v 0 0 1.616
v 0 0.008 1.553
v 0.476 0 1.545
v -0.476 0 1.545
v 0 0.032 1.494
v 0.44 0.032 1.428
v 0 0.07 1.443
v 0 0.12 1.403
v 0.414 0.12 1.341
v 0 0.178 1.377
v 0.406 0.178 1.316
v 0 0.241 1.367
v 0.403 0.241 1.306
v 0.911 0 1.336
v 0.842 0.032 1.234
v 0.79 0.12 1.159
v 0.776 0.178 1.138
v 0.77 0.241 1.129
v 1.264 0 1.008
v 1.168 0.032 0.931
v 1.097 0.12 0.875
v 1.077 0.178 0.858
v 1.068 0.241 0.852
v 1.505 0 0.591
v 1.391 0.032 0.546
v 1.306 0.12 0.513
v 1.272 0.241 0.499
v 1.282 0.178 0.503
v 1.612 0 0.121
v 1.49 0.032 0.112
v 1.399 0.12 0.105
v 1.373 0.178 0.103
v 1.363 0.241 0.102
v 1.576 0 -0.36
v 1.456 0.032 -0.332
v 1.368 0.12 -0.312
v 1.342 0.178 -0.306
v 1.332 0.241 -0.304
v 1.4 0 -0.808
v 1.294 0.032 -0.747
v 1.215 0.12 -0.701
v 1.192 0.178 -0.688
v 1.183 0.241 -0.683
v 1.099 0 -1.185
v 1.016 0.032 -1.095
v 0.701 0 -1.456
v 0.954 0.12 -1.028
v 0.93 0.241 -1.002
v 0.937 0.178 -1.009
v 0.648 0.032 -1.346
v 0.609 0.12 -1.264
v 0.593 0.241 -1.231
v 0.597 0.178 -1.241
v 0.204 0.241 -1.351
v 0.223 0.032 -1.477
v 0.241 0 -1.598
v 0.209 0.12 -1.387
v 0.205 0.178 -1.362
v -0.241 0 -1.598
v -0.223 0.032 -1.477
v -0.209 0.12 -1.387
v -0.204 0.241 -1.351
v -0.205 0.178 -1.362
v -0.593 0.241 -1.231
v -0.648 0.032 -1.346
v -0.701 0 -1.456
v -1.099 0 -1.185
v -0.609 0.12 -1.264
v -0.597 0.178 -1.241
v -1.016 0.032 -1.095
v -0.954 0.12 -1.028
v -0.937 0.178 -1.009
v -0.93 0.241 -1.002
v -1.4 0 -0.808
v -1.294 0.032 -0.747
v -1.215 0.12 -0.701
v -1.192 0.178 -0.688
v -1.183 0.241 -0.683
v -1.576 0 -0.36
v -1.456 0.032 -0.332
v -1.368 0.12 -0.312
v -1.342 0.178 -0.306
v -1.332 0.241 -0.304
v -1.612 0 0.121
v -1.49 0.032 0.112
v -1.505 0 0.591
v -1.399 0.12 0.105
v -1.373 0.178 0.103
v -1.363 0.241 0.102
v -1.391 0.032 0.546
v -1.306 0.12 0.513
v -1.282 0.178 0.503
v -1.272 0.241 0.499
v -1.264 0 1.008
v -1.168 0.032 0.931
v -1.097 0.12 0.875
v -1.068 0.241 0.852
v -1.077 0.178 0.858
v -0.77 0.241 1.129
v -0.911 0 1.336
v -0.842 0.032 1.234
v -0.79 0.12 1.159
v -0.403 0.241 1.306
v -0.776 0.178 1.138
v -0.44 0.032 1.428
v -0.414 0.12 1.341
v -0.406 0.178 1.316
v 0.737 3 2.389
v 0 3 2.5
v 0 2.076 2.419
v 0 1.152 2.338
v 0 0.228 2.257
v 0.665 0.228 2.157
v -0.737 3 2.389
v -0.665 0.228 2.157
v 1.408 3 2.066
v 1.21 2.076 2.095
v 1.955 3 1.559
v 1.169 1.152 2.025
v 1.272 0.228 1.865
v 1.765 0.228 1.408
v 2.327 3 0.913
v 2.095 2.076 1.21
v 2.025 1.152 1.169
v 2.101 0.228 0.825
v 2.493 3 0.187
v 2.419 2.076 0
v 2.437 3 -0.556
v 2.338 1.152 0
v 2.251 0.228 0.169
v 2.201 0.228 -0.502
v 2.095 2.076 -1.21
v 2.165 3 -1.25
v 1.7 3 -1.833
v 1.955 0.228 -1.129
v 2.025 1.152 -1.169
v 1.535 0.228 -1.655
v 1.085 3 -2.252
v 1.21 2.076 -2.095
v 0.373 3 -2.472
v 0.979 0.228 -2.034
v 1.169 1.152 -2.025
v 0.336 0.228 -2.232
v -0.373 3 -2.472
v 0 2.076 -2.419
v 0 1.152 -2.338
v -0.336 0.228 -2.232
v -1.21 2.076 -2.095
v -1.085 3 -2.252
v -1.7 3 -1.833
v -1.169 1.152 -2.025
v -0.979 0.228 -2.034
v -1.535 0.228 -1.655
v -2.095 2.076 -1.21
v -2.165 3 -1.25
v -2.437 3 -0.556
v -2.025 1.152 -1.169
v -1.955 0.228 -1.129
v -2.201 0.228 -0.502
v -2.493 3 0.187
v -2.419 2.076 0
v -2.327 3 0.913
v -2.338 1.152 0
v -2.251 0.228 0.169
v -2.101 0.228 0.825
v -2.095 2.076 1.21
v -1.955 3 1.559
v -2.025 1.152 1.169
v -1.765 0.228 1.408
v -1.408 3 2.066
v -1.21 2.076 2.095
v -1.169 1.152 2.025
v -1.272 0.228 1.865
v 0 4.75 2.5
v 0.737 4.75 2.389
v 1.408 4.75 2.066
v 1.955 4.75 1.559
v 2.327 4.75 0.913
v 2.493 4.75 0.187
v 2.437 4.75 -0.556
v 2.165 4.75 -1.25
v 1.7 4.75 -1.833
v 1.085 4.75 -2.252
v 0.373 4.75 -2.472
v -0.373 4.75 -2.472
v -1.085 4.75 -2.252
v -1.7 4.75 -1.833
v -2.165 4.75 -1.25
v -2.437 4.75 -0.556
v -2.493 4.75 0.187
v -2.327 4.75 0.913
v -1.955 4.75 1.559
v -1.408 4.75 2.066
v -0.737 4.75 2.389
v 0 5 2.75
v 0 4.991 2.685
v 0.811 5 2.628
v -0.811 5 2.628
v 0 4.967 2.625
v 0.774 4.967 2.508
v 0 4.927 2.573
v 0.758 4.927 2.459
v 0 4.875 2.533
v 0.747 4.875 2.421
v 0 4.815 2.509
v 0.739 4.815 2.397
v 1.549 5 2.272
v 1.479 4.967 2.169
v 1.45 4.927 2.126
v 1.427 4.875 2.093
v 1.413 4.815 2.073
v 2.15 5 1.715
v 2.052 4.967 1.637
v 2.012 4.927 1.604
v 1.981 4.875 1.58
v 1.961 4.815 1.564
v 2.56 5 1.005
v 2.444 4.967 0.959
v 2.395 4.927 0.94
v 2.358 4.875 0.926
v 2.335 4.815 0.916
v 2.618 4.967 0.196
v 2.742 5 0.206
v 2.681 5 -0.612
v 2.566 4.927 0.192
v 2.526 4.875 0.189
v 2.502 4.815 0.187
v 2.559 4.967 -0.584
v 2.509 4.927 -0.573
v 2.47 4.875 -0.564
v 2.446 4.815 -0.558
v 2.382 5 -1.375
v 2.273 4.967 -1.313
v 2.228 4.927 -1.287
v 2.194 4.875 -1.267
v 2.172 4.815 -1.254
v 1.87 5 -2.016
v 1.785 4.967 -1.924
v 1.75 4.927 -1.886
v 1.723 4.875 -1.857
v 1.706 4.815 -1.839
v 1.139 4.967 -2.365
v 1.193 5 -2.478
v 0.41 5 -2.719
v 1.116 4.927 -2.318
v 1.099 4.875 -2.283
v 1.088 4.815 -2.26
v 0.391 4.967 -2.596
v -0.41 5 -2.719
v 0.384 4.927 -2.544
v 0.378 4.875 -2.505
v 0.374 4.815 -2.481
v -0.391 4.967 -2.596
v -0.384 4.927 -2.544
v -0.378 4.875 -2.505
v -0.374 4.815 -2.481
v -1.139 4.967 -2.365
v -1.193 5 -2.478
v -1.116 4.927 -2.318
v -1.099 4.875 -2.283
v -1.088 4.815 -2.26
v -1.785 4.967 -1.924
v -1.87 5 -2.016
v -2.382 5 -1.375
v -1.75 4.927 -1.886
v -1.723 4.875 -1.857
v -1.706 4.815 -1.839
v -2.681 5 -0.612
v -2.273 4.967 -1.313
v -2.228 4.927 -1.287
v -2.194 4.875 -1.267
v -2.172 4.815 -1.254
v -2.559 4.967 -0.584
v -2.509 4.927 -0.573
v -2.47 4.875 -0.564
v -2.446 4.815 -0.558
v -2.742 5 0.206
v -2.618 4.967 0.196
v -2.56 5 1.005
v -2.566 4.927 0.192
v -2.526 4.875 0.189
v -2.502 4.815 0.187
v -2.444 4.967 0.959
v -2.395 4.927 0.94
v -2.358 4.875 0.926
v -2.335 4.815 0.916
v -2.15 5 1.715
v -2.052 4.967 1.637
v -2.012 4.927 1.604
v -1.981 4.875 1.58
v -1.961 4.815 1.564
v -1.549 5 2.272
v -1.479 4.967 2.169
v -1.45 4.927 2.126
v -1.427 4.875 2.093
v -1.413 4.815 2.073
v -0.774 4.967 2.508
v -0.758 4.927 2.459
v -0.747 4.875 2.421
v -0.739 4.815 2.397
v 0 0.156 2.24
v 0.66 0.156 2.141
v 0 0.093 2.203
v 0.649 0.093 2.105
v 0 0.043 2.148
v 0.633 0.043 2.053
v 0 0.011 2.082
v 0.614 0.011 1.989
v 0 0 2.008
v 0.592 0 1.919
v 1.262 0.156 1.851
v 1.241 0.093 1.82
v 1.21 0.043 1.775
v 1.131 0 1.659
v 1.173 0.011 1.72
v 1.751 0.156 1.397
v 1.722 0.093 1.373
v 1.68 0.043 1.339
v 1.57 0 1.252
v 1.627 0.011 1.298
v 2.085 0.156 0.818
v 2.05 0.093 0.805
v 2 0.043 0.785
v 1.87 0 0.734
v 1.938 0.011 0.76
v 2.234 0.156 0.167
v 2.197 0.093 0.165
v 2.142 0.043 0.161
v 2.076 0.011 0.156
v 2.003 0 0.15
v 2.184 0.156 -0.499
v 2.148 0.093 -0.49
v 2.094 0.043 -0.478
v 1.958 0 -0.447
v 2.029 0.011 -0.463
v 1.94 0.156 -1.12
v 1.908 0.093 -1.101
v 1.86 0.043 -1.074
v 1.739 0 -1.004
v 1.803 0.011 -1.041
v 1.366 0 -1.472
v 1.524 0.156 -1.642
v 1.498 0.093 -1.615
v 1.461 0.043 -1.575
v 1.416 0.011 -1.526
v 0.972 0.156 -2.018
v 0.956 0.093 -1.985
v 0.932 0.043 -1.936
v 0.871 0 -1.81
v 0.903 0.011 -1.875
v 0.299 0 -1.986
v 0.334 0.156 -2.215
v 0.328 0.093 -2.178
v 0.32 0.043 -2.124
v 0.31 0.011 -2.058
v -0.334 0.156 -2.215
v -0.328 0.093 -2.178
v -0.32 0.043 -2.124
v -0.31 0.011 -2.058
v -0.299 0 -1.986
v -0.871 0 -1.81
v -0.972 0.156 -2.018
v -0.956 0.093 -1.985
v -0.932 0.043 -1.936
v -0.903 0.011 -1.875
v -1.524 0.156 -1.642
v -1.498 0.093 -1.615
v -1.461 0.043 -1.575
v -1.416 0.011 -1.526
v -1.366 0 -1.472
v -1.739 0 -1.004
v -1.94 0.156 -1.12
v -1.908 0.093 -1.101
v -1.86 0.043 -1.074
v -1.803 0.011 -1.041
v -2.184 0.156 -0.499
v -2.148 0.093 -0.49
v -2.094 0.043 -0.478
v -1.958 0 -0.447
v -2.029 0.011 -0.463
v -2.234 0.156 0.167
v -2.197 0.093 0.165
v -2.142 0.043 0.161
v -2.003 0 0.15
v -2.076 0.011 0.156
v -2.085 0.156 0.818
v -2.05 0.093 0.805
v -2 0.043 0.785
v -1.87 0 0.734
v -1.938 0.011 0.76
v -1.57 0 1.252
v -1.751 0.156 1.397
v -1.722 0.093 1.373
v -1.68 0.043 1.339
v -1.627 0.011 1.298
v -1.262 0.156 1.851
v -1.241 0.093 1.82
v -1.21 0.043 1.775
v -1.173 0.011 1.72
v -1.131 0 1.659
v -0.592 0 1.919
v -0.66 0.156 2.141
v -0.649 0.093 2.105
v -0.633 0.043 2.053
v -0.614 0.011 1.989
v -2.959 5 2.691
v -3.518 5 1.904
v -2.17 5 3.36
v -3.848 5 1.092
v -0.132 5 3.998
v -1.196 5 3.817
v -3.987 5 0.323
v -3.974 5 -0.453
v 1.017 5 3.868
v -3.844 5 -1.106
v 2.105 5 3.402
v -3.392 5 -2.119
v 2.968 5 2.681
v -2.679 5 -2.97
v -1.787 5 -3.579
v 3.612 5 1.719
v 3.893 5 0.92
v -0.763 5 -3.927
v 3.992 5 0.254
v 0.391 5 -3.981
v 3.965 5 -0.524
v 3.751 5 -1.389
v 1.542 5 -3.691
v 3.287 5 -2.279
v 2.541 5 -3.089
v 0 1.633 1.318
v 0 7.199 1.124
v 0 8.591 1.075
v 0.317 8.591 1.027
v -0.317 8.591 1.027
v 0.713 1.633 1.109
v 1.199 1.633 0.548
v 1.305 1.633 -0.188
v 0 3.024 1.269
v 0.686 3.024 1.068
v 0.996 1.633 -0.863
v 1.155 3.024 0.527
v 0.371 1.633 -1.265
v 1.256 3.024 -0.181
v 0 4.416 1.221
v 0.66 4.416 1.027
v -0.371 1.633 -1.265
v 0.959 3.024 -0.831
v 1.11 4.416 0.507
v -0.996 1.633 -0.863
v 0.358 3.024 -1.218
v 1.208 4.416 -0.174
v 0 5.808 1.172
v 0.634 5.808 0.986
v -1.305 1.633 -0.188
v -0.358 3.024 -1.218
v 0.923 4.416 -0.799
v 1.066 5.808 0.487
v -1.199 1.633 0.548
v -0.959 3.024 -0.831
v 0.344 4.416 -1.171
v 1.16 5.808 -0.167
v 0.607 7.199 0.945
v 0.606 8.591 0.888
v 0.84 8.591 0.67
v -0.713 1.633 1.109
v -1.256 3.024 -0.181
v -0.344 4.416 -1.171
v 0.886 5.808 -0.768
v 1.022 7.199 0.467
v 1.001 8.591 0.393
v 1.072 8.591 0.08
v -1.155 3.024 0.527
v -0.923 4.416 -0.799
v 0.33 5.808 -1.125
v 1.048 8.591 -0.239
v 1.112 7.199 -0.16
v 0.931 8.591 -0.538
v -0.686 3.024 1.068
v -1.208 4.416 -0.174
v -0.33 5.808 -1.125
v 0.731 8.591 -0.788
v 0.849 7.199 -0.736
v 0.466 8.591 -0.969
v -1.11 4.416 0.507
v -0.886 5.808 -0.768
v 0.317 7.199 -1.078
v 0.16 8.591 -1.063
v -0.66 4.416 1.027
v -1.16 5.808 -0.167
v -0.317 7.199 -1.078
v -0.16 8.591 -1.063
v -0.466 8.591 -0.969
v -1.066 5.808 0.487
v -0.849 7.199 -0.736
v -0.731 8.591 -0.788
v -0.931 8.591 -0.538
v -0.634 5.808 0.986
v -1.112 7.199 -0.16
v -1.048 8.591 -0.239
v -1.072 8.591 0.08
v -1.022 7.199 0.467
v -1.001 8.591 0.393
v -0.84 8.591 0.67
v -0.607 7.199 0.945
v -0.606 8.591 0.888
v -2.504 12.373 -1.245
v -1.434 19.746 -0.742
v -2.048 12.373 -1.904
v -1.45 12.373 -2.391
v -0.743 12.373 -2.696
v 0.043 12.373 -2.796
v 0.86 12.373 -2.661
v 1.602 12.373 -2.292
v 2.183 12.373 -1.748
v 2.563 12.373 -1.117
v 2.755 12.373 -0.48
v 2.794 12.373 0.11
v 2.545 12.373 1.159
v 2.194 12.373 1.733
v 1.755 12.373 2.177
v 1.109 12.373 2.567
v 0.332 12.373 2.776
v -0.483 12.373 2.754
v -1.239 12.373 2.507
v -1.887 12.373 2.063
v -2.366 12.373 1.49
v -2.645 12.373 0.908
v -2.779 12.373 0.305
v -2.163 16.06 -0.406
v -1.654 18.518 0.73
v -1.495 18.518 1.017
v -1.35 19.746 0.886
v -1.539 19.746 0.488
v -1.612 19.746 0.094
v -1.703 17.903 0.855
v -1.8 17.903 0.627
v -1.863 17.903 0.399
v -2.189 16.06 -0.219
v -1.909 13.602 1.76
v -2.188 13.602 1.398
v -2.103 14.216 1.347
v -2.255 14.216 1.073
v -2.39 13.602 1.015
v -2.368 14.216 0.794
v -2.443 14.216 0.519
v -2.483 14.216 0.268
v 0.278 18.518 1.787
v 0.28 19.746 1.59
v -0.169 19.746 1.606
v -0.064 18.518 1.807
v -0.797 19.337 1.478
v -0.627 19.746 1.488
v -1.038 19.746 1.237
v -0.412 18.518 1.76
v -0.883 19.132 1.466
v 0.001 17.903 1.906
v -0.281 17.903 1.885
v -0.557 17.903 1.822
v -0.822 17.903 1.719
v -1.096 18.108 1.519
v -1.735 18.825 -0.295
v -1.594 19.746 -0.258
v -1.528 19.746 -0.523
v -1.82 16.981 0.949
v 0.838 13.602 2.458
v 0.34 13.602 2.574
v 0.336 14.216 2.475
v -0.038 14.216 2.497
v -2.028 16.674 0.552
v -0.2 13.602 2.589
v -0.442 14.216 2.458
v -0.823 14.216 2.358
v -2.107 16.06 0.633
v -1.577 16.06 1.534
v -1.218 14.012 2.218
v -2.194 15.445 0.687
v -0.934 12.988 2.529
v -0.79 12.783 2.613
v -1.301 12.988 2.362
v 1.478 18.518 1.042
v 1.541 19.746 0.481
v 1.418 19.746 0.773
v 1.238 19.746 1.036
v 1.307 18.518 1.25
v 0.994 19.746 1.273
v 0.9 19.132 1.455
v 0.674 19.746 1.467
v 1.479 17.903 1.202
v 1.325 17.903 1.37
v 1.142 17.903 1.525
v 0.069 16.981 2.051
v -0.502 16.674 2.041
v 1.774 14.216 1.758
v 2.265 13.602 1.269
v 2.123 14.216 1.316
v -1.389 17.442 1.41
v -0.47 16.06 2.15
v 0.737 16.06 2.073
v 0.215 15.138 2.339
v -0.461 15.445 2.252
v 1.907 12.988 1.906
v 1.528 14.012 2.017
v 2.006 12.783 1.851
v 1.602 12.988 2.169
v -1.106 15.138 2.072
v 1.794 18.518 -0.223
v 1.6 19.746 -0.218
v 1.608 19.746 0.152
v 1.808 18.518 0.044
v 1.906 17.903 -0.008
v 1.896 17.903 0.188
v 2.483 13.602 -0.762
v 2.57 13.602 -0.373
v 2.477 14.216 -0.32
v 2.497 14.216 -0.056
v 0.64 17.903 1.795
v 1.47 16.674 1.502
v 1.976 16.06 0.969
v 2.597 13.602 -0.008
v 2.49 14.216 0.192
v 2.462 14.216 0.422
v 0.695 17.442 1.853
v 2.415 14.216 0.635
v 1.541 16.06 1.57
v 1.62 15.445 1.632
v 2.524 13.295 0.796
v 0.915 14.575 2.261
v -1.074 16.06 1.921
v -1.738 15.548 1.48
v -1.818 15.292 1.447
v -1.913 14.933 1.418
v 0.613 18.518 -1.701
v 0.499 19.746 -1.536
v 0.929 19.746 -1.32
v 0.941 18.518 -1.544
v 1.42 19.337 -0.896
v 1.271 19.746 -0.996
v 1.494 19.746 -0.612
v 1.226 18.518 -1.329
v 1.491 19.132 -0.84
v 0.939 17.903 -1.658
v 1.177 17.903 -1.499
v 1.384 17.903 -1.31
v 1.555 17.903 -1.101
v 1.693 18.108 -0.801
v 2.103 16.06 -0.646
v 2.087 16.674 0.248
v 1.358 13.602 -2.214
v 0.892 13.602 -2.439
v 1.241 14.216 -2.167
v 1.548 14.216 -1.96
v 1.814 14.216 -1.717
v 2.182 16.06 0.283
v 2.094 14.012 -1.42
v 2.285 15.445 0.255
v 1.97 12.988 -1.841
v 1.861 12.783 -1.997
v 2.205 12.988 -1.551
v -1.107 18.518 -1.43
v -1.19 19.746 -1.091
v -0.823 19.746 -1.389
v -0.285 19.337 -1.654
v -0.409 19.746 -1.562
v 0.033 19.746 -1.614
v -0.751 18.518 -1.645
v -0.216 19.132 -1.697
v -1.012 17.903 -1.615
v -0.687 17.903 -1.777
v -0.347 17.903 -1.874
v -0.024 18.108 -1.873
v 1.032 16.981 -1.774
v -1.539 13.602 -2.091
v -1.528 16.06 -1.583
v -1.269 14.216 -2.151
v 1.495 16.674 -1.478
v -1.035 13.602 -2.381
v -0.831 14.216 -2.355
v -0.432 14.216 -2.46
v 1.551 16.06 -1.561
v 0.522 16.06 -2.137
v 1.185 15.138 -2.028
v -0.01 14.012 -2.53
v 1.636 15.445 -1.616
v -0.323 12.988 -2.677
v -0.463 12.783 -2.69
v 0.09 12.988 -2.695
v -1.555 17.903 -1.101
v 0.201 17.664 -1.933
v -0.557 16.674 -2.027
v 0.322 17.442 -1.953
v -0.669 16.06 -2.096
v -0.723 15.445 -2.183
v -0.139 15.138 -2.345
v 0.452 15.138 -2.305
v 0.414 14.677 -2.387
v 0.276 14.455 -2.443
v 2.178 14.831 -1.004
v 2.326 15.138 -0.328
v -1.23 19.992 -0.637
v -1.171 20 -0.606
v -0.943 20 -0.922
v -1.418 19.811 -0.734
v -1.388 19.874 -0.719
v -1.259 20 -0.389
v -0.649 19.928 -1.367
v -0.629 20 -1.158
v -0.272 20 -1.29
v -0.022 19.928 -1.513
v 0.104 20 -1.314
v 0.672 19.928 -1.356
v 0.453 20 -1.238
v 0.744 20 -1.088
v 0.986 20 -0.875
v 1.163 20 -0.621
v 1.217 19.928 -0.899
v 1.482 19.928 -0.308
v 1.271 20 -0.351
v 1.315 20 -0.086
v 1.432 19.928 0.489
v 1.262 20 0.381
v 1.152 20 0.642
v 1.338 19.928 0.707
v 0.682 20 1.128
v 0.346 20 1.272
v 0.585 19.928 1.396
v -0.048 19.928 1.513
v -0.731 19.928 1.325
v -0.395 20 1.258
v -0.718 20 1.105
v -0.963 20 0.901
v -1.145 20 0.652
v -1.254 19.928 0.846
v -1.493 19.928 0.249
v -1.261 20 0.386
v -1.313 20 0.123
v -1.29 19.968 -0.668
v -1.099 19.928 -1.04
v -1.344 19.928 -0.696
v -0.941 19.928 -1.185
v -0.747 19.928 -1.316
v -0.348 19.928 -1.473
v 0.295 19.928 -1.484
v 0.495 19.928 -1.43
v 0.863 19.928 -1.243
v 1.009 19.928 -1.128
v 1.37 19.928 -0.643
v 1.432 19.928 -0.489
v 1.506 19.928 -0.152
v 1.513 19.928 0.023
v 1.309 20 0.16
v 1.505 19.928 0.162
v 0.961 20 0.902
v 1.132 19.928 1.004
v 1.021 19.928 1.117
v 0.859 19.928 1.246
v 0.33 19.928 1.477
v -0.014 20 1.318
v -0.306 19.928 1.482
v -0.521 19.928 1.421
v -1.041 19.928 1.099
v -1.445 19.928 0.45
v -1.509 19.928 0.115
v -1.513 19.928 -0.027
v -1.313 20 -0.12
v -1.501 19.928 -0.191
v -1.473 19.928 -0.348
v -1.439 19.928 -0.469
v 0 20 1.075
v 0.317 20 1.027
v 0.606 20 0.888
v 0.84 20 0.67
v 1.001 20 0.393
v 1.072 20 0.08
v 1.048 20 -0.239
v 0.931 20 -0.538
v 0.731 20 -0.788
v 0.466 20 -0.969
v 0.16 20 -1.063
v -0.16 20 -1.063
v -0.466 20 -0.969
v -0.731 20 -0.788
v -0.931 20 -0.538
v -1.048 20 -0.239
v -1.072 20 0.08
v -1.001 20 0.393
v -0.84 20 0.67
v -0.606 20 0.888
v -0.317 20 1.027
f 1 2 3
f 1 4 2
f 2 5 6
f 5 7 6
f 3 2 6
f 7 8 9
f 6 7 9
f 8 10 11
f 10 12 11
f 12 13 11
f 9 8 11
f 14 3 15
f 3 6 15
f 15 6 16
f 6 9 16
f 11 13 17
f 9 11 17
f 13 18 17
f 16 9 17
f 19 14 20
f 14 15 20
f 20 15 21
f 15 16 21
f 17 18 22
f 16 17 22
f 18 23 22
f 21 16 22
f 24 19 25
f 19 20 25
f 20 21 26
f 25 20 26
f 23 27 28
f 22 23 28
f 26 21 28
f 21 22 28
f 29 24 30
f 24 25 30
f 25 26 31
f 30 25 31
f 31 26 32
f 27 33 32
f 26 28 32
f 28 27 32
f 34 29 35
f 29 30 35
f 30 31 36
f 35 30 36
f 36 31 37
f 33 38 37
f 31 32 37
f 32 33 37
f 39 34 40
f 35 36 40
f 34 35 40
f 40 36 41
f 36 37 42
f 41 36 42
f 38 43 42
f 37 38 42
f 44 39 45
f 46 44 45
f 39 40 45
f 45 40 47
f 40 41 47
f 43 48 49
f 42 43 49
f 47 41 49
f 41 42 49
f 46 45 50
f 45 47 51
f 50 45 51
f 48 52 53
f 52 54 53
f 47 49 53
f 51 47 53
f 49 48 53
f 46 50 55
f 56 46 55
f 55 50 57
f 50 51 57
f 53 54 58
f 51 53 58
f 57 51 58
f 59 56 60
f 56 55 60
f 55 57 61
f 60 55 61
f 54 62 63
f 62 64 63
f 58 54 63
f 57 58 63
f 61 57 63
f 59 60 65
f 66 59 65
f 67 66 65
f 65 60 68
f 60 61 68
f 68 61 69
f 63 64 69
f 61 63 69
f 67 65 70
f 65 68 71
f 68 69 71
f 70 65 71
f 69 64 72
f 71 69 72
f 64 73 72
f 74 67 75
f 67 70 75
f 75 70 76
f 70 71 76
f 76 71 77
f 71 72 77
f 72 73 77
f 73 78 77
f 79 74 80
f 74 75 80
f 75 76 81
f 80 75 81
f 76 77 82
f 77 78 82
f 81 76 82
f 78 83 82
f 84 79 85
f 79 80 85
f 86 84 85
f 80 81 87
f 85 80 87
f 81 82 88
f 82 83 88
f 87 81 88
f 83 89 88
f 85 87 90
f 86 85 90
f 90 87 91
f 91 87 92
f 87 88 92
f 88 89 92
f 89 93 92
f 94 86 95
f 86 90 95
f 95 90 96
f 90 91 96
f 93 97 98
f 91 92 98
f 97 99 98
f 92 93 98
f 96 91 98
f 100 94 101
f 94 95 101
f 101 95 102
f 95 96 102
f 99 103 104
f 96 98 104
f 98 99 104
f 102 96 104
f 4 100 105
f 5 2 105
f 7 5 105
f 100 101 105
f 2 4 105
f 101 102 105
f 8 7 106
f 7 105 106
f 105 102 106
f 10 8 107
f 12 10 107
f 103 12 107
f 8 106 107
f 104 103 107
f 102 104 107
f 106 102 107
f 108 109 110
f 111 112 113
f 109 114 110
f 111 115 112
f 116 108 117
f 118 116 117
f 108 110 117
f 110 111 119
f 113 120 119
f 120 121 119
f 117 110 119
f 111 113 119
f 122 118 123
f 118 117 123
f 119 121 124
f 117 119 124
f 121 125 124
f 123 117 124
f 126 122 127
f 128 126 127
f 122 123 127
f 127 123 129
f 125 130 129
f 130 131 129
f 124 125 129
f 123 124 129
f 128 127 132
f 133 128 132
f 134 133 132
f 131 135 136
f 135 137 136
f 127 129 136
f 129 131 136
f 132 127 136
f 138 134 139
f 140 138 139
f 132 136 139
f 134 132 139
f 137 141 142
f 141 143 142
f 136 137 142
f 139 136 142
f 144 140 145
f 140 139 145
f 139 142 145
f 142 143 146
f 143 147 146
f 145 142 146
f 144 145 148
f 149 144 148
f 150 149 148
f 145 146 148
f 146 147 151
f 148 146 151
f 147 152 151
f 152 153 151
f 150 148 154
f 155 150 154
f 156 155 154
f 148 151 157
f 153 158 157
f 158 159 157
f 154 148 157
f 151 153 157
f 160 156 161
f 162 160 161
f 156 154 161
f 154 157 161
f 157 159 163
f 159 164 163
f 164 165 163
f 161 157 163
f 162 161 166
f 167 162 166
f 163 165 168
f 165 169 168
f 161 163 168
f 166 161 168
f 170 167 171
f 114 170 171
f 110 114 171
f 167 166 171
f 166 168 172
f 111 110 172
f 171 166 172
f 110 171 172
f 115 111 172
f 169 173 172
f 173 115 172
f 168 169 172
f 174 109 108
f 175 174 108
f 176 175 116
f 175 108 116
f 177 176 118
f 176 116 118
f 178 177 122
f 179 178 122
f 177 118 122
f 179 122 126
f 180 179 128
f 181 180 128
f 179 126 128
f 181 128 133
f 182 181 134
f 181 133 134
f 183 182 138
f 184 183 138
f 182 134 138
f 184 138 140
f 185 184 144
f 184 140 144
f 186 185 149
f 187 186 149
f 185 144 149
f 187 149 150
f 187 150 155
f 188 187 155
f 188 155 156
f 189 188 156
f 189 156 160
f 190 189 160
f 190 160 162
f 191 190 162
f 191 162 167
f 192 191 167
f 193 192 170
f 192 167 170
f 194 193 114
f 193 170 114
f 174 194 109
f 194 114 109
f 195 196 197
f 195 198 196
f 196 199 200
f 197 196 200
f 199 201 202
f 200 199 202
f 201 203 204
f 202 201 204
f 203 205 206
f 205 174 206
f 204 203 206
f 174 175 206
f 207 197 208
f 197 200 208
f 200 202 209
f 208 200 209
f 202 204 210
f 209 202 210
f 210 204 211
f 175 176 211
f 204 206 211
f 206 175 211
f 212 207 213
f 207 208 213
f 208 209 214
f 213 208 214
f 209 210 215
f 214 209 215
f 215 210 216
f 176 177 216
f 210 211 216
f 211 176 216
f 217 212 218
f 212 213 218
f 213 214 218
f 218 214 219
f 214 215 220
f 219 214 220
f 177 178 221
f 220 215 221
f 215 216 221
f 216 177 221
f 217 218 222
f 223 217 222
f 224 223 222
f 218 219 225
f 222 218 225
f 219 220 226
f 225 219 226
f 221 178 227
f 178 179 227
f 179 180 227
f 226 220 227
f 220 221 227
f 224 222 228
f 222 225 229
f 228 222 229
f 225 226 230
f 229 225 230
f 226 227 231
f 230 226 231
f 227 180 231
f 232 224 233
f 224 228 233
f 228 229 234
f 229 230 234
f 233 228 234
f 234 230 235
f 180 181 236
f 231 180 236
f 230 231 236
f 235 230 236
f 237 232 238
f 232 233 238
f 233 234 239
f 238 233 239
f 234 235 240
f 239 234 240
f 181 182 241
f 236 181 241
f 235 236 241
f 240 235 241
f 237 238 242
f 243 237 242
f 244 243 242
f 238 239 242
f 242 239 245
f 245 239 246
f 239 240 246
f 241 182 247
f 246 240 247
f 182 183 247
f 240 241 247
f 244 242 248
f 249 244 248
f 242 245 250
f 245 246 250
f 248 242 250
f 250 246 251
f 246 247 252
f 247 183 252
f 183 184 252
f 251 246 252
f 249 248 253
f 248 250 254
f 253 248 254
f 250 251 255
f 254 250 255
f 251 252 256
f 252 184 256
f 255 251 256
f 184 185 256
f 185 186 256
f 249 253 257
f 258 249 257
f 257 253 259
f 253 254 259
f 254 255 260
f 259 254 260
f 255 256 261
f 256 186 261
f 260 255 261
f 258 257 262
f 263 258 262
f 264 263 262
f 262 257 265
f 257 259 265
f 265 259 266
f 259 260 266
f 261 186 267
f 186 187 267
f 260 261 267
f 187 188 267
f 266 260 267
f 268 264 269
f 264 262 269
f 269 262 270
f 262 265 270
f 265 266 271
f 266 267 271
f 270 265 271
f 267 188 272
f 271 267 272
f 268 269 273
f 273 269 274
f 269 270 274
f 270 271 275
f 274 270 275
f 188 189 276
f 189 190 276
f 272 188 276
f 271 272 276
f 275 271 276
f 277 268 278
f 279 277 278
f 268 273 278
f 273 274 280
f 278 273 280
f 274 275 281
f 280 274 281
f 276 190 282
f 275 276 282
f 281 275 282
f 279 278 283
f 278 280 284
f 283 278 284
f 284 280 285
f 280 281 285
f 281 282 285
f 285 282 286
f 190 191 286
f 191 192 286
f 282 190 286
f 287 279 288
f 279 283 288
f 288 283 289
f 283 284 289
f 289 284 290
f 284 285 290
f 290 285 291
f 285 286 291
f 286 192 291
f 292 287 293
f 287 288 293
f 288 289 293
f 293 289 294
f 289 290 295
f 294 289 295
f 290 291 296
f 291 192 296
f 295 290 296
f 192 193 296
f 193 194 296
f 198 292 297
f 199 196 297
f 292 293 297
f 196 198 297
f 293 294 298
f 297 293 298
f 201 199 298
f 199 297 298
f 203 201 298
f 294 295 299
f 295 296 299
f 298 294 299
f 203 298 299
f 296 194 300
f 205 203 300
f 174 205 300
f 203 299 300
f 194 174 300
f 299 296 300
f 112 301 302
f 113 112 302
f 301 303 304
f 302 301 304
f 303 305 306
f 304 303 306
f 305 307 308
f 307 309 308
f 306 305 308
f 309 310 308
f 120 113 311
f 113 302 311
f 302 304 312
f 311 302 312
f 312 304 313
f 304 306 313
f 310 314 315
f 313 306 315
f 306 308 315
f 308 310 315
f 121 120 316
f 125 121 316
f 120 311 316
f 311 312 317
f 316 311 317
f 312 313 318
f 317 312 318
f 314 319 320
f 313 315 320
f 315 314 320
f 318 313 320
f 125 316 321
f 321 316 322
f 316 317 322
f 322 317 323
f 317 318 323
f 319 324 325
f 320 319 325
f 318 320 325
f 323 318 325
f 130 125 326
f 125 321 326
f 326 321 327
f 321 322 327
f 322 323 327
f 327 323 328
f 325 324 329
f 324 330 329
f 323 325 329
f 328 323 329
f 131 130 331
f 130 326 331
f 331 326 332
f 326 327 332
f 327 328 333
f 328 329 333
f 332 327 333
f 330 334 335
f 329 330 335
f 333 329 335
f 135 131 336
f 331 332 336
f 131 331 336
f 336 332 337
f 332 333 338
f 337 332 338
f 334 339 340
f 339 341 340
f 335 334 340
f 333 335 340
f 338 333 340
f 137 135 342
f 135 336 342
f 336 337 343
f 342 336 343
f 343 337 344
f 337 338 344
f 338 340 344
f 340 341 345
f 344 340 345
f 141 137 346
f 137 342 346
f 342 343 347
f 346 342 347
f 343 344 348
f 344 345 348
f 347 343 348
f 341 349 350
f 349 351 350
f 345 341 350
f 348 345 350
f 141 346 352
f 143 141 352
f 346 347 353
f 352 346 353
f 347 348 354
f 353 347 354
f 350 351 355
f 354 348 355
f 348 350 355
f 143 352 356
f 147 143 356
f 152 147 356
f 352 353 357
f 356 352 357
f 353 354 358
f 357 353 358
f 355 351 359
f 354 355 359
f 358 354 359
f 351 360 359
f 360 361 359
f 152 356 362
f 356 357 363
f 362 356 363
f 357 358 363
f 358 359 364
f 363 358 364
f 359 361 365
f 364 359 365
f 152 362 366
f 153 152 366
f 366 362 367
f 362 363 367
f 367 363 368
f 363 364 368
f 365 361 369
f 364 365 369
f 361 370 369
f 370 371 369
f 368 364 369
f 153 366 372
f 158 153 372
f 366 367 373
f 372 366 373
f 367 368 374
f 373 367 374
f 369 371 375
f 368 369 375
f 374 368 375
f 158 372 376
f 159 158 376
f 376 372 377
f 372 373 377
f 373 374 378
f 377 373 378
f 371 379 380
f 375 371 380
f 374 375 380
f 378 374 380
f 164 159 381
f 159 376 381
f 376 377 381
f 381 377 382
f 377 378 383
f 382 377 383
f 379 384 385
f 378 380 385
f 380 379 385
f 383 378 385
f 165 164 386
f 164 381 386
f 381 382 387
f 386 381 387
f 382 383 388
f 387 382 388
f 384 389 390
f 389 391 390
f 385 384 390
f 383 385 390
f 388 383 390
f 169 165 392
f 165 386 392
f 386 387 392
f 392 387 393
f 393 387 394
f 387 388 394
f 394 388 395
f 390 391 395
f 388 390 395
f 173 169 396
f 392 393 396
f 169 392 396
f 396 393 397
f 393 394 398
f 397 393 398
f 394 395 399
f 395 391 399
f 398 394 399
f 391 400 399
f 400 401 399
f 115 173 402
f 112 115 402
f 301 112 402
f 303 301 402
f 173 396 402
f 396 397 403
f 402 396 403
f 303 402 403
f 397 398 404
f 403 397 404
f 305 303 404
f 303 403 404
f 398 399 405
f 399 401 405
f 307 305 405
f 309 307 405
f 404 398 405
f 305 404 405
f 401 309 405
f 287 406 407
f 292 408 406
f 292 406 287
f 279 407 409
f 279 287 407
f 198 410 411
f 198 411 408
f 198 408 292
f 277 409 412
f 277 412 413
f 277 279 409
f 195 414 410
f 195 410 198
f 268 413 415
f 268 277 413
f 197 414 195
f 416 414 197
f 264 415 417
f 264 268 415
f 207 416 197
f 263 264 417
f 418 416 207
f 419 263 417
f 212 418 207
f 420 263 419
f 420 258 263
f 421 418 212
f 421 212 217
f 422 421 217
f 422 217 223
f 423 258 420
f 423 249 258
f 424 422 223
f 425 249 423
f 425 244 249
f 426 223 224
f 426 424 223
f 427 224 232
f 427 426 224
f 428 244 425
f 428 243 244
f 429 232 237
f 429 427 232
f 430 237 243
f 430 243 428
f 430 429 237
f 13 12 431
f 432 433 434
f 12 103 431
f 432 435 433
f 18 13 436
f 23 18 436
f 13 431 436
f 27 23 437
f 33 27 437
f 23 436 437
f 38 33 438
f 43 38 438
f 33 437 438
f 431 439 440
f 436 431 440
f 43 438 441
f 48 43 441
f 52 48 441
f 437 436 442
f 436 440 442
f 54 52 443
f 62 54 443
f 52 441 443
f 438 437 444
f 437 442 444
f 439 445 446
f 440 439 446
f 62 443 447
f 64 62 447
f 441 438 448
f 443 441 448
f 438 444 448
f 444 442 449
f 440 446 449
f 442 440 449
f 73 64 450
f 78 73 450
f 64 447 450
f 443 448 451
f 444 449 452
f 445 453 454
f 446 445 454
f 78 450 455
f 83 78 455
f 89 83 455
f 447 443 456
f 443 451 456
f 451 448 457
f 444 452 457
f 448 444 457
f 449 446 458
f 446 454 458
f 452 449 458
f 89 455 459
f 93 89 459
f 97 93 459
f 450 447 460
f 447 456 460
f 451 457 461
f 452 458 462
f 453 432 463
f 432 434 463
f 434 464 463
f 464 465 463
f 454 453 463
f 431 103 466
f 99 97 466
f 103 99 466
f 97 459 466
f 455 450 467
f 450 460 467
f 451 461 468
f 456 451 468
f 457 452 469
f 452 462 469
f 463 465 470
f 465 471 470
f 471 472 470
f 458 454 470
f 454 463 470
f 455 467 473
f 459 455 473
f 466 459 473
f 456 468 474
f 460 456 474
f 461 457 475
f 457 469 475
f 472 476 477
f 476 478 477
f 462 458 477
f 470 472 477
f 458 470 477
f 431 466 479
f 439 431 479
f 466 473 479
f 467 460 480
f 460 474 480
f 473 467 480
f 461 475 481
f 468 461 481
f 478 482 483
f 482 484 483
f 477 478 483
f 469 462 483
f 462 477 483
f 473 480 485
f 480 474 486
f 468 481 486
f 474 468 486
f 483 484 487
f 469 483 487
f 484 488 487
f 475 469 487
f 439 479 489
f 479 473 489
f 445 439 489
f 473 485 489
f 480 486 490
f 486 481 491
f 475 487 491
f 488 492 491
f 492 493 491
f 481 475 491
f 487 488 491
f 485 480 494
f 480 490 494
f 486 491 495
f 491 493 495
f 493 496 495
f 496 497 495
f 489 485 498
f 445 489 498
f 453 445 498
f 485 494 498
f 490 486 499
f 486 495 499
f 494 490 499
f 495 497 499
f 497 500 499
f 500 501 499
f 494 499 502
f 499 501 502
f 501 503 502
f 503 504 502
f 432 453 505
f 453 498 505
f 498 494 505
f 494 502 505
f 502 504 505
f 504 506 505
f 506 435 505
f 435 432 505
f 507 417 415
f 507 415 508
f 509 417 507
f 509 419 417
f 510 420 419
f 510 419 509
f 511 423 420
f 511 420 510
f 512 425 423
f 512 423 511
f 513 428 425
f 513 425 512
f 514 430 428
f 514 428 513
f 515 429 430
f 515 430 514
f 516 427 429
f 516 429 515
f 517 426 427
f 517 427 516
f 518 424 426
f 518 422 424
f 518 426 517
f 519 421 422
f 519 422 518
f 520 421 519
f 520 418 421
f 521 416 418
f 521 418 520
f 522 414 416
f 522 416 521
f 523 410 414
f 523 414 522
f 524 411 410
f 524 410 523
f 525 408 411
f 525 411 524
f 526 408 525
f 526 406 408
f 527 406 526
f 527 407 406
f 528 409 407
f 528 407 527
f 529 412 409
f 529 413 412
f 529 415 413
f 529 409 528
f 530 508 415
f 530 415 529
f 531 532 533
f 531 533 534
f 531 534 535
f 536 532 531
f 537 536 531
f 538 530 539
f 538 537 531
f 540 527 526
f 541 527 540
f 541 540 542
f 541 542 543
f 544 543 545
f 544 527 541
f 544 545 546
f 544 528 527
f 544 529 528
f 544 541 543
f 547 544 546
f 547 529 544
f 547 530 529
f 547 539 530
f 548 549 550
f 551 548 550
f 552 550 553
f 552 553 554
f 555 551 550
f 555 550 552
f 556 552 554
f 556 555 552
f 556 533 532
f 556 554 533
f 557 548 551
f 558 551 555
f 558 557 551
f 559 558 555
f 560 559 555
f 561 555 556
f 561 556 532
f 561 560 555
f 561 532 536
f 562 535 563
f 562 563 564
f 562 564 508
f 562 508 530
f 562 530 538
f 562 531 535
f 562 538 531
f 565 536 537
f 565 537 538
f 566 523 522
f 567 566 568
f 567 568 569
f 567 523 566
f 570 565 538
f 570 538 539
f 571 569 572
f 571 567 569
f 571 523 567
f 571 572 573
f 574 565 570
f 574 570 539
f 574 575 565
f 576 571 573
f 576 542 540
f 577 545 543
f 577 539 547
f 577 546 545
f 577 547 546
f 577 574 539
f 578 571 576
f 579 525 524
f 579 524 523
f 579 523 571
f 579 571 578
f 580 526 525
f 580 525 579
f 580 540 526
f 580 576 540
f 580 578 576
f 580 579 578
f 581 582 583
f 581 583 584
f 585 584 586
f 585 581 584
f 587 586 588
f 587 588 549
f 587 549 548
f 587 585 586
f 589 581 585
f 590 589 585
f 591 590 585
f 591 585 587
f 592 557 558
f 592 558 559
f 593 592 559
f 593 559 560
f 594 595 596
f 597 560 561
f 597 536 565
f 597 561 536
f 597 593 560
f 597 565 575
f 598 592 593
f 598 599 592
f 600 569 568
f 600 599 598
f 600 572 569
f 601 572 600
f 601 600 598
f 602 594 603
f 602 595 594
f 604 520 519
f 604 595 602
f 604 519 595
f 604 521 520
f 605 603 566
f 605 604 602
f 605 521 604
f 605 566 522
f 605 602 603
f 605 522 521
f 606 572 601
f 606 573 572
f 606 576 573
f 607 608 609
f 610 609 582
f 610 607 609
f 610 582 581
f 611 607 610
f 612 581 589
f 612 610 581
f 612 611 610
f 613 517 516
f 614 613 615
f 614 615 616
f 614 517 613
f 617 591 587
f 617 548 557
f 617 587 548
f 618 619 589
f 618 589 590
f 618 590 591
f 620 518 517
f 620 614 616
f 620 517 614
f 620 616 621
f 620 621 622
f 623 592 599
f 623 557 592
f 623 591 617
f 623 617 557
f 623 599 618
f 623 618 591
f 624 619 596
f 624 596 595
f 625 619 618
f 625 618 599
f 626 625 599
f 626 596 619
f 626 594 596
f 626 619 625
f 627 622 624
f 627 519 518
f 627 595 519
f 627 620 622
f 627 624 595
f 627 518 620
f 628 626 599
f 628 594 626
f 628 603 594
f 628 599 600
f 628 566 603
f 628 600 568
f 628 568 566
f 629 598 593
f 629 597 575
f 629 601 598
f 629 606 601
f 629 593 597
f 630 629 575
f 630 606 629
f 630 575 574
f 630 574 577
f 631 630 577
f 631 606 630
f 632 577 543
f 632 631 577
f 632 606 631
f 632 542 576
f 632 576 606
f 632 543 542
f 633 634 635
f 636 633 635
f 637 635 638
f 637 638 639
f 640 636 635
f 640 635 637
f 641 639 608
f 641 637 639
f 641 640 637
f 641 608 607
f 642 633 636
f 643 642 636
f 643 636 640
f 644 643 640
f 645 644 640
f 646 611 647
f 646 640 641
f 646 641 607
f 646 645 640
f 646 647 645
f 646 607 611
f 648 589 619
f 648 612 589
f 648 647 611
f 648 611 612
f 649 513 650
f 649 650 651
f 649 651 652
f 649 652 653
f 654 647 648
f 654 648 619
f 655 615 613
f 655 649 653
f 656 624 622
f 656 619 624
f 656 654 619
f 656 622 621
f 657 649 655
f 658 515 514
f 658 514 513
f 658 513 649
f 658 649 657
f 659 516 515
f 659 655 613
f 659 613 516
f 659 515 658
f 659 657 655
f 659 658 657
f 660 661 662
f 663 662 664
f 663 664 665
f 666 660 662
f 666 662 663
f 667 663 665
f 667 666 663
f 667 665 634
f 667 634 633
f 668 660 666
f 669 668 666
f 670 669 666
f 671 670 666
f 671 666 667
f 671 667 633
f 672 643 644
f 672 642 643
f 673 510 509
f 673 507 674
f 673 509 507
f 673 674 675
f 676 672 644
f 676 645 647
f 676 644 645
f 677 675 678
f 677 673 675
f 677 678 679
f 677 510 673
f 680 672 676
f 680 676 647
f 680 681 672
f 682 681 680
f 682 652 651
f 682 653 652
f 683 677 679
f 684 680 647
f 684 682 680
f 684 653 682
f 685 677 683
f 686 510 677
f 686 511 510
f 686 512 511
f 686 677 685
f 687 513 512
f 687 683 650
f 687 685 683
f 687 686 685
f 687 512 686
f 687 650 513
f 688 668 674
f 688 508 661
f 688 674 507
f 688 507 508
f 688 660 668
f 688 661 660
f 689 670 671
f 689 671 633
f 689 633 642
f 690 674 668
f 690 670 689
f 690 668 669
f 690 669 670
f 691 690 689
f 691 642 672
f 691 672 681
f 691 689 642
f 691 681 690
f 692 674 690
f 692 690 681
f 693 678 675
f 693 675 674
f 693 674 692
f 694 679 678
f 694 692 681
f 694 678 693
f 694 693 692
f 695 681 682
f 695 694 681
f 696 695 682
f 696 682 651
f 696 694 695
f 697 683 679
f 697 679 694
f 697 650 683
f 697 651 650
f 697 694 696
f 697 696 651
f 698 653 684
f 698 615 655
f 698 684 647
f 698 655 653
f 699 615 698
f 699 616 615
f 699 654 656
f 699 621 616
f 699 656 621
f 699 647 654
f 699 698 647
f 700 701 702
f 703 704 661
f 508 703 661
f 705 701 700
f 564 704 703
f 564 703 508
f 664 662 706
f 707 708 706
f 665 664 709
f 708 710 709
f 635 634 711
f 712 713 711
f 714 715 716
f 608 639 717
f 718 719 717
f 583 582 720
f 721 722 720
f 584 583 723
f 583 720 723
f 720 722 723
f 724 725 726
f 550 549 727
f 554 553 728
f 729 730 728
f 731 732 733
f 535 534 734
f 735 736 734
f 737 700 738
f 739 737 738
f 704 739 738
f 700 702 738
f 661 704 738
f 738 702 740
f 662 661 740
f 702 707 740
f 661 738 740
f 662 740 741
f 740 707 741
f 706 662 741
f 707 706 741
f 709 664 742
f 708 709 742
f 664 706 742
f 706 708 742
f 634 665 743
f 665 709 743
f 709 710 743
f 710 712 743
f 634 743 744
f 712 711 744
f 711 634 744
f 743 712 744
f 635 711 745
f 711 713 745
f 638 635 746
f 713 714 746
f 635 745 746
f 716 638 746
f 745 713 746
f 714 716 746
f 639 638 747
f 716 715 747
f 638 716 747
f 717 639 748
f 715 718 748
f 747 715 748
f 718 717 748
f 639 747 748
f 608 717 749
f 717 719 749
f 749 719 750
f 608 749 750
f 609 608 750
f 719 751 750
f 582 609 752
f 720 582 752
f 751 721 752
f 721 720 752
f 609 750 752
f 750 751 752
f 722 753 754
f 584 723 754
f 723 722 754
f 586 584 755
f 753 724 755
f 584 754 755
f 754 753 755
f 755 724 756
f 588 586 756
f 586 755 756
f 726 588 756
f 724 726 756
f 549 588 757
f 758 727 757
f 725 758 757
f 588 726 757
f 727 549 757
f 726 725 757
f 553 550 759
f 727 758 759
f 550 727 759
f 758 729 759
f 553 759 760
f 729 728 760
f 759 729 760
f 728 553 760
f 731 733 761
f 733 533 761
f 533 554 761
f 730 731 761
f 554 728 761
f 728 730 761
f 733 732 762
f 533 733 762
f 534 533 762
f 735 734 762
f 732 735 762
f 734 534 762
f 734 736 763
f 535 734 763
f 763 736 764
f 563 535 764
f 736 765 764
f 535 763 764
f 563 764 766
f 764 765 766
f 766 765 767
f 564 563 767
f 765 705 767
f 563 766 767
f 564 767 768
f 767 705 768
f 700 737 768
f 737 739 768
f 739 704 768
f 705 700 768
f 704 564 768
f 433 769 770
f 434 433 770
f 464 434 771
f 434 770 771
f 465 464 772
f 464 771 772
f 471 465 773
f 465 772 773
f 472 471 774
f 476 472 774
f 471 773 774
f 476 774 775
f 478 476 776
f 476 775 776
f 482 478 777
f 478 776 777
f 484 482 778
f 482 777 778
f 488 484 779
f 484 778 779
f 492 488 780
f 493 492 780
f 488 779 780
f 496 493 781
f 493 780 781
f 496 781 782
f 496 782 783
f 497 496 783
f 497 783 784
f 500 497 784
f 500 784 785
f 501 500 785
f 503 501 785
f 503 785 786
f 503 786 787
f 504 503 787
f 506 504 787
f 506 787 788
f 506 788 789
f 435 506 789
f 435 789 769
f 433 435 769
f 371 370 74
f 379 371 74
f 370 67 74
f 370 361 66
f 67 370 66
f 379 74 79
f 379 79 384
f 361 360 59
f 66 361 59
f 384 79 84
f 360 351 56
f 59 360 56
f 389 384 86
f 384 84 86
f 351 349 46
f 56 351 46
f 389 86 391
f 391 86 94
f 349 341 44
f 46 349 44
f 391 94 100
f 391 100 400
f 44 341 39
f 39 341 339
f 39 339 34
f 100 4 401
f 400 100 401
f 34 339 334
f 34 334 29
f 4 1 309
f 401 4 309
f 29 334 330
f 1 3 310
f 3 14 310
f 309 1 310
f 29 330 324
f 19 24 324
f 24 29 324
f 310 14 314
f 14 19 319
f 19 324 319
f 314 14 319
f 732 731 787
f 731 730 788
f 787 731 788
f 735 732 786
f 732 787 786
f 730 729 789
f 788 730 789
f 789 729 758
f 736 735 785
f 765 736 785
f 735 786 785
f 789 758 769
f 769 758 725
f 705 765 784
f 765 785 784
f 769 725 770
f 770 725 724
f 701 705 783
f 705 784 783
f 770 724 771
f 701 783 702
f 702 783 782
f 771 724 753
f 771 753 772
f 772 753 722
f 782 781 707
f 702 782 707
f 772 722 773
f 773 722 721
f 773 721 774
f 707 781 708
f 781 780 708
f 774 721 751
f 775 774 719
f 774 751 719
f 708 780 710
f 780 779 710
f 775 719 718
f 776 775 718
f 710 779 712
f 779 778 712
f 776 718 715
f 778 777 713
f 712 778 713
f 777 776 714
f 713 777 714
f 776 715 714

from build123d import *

# Parameters (mm, degrees)
SKETCH1_R           = 2.5
BOSS_EXTRUDE1_DEPTH = 5
SKETCH4_R           = 1.075
CUT_EXTRUDE1_DEPTH  = 21.784609729
CHAMFER1_SIZE       = 0.3
CHAMFER1_SIZE2      = 8.590875985
CHAMFER2_SIZE       = 3
CHAMFER2_SIZE2      = 0.262465991
FILLET1_R           = 0.3
FILLET2_R           = 0.25
FILLET4_R           = 0.25


with BuildPart() as part:
    # Sketch1 → Boss-Extrude1 (new body)
    with BuildSketch(Plane(origin=(0, 0, 0), x_dir=(1, 0, 0), z_dir=(0, 1, 0))):
        with Locations(Location((0, 0, 0), (0, 0, 270))):
            Circle(SKETCH1_R)
    extrude(amount=BOSS_EXTRUDE1_DEPTH)

    # Loft1: read off the stored shape, not the designer's step
    # Loft1: loft between two sections, ruled curve by curve
    loft1_from = [
        Edge.make_bspline([(-1.392393657, 20, -0.736114736), (0.079835815, 20, -3.52090205), (2.864623129, 20, -2.048672577), (1.392393657, 20, 0.736114736), (-0.079835815, 20, 3.52090205), (-2.864623129, 20, 2.048672577), (-1.392393657, 20, -0.736114736)], [0, 0, 0, 0, 0.5, 0.5, 0.5, 1, 1, 1, 1], 3, [1, 0.333333333, 0.333333333, 1, 0.333333333, 0.333333333, 1]),
    ]
    loft1_to = [
        Edge.make_bspline([(-3.843967333, 5, -1.106306985), (-1.631353363, 5, -8.79424165), (6.056581302, 5, -6.581627681), (3.843967333, 5, 1.106306985), (1.631353363, 5, 8.79424165), (-6.056581302, 5, 6.581627681), (-3.843967333, 5, -1.106306985)], [0, 0, 0, 0, 0.5, 0.5, 0.5, 1, 1, 1, 1], 3, [1, 0.333333333, 0.333333333, 1, 0.333333333, 0.333333333, 1]),
    ]
    loft1 = Solid(Shell([*[Face.make_surface_from_curves(loft1_from[k], loft1_to[k]) for k in range(1)], Face(Wire(loft1_from)), Face(Wire(loft1_to))]))
    add(loft1)

    # Sketch4 → Cut-Extrude1 (cut, through all)
    with BuildSketch(Plane(origin=(0, 20, 0), x_dir=(1, 0, 0), z_dir=(0, 1, 0))):
        with Locations(Location((0, 0, 0), (0, 0, 270))):
            Circle(SKETCH4_R)
    extrude(amount=-CUT_EXTRUDE1_DEPTH, mode=Mode.SUBTRACT)

    # Chamfer1
    chamfer1_edges = [part.edges().sort_by_distance(p)[0] for p in [
        (0, 0, -1.075),
    ]]
    chamfer1_side = [part.faces().sort_by_distance(p)[0] for p in [
        (0, 0, -2.429289322),
    ]]
    chamfer(chamfer1_edges, length=CHAMFER1_SIZE, length2=CHAMFER1_SIZE2, reference=chamfer1_side[0])

    # Chamfer2
    chamfer2_edges = [part.edges().sort_by_distance(p)[0] for p in [
        (0, 0, -2.5),
    ]]
    chamfer2_side = [part.faces().sort_by_distance(p)[0] for p in [
        (0, 2.5, -2.5),
    ]]
    chamfer(chamfer2_edges, length=CHAMFER2_SIZE, length2=CHAMFER2_SIZE2, reference=chamfer2_side[0])

    # Fillet1
    fillet1_edges = [part.edges().sort_by_distance(p)[0] for p in [
        (1.392393657, 20, 0.736114736),
    ]]
    fillet(fillet1_edges, radius=FILLET1_R)

    # Fillet2
    fillet2_edges = [part.edges().sort_by_distance(p)[0] for p in [
        (0, 5, -2.5),
    ]]
    fillet(fillet2_edges, radius=FILLET2_R)

    # Fillet4
    fillet4_edges = [part.edges().sort_by_distance(p)[0] for p in [
        (0, 0, -1.375),
        (0, 0, -2.237534009),
    ]]
    fillet(fillet4_edges, radius=FILLET4_R)


solid = part.part
